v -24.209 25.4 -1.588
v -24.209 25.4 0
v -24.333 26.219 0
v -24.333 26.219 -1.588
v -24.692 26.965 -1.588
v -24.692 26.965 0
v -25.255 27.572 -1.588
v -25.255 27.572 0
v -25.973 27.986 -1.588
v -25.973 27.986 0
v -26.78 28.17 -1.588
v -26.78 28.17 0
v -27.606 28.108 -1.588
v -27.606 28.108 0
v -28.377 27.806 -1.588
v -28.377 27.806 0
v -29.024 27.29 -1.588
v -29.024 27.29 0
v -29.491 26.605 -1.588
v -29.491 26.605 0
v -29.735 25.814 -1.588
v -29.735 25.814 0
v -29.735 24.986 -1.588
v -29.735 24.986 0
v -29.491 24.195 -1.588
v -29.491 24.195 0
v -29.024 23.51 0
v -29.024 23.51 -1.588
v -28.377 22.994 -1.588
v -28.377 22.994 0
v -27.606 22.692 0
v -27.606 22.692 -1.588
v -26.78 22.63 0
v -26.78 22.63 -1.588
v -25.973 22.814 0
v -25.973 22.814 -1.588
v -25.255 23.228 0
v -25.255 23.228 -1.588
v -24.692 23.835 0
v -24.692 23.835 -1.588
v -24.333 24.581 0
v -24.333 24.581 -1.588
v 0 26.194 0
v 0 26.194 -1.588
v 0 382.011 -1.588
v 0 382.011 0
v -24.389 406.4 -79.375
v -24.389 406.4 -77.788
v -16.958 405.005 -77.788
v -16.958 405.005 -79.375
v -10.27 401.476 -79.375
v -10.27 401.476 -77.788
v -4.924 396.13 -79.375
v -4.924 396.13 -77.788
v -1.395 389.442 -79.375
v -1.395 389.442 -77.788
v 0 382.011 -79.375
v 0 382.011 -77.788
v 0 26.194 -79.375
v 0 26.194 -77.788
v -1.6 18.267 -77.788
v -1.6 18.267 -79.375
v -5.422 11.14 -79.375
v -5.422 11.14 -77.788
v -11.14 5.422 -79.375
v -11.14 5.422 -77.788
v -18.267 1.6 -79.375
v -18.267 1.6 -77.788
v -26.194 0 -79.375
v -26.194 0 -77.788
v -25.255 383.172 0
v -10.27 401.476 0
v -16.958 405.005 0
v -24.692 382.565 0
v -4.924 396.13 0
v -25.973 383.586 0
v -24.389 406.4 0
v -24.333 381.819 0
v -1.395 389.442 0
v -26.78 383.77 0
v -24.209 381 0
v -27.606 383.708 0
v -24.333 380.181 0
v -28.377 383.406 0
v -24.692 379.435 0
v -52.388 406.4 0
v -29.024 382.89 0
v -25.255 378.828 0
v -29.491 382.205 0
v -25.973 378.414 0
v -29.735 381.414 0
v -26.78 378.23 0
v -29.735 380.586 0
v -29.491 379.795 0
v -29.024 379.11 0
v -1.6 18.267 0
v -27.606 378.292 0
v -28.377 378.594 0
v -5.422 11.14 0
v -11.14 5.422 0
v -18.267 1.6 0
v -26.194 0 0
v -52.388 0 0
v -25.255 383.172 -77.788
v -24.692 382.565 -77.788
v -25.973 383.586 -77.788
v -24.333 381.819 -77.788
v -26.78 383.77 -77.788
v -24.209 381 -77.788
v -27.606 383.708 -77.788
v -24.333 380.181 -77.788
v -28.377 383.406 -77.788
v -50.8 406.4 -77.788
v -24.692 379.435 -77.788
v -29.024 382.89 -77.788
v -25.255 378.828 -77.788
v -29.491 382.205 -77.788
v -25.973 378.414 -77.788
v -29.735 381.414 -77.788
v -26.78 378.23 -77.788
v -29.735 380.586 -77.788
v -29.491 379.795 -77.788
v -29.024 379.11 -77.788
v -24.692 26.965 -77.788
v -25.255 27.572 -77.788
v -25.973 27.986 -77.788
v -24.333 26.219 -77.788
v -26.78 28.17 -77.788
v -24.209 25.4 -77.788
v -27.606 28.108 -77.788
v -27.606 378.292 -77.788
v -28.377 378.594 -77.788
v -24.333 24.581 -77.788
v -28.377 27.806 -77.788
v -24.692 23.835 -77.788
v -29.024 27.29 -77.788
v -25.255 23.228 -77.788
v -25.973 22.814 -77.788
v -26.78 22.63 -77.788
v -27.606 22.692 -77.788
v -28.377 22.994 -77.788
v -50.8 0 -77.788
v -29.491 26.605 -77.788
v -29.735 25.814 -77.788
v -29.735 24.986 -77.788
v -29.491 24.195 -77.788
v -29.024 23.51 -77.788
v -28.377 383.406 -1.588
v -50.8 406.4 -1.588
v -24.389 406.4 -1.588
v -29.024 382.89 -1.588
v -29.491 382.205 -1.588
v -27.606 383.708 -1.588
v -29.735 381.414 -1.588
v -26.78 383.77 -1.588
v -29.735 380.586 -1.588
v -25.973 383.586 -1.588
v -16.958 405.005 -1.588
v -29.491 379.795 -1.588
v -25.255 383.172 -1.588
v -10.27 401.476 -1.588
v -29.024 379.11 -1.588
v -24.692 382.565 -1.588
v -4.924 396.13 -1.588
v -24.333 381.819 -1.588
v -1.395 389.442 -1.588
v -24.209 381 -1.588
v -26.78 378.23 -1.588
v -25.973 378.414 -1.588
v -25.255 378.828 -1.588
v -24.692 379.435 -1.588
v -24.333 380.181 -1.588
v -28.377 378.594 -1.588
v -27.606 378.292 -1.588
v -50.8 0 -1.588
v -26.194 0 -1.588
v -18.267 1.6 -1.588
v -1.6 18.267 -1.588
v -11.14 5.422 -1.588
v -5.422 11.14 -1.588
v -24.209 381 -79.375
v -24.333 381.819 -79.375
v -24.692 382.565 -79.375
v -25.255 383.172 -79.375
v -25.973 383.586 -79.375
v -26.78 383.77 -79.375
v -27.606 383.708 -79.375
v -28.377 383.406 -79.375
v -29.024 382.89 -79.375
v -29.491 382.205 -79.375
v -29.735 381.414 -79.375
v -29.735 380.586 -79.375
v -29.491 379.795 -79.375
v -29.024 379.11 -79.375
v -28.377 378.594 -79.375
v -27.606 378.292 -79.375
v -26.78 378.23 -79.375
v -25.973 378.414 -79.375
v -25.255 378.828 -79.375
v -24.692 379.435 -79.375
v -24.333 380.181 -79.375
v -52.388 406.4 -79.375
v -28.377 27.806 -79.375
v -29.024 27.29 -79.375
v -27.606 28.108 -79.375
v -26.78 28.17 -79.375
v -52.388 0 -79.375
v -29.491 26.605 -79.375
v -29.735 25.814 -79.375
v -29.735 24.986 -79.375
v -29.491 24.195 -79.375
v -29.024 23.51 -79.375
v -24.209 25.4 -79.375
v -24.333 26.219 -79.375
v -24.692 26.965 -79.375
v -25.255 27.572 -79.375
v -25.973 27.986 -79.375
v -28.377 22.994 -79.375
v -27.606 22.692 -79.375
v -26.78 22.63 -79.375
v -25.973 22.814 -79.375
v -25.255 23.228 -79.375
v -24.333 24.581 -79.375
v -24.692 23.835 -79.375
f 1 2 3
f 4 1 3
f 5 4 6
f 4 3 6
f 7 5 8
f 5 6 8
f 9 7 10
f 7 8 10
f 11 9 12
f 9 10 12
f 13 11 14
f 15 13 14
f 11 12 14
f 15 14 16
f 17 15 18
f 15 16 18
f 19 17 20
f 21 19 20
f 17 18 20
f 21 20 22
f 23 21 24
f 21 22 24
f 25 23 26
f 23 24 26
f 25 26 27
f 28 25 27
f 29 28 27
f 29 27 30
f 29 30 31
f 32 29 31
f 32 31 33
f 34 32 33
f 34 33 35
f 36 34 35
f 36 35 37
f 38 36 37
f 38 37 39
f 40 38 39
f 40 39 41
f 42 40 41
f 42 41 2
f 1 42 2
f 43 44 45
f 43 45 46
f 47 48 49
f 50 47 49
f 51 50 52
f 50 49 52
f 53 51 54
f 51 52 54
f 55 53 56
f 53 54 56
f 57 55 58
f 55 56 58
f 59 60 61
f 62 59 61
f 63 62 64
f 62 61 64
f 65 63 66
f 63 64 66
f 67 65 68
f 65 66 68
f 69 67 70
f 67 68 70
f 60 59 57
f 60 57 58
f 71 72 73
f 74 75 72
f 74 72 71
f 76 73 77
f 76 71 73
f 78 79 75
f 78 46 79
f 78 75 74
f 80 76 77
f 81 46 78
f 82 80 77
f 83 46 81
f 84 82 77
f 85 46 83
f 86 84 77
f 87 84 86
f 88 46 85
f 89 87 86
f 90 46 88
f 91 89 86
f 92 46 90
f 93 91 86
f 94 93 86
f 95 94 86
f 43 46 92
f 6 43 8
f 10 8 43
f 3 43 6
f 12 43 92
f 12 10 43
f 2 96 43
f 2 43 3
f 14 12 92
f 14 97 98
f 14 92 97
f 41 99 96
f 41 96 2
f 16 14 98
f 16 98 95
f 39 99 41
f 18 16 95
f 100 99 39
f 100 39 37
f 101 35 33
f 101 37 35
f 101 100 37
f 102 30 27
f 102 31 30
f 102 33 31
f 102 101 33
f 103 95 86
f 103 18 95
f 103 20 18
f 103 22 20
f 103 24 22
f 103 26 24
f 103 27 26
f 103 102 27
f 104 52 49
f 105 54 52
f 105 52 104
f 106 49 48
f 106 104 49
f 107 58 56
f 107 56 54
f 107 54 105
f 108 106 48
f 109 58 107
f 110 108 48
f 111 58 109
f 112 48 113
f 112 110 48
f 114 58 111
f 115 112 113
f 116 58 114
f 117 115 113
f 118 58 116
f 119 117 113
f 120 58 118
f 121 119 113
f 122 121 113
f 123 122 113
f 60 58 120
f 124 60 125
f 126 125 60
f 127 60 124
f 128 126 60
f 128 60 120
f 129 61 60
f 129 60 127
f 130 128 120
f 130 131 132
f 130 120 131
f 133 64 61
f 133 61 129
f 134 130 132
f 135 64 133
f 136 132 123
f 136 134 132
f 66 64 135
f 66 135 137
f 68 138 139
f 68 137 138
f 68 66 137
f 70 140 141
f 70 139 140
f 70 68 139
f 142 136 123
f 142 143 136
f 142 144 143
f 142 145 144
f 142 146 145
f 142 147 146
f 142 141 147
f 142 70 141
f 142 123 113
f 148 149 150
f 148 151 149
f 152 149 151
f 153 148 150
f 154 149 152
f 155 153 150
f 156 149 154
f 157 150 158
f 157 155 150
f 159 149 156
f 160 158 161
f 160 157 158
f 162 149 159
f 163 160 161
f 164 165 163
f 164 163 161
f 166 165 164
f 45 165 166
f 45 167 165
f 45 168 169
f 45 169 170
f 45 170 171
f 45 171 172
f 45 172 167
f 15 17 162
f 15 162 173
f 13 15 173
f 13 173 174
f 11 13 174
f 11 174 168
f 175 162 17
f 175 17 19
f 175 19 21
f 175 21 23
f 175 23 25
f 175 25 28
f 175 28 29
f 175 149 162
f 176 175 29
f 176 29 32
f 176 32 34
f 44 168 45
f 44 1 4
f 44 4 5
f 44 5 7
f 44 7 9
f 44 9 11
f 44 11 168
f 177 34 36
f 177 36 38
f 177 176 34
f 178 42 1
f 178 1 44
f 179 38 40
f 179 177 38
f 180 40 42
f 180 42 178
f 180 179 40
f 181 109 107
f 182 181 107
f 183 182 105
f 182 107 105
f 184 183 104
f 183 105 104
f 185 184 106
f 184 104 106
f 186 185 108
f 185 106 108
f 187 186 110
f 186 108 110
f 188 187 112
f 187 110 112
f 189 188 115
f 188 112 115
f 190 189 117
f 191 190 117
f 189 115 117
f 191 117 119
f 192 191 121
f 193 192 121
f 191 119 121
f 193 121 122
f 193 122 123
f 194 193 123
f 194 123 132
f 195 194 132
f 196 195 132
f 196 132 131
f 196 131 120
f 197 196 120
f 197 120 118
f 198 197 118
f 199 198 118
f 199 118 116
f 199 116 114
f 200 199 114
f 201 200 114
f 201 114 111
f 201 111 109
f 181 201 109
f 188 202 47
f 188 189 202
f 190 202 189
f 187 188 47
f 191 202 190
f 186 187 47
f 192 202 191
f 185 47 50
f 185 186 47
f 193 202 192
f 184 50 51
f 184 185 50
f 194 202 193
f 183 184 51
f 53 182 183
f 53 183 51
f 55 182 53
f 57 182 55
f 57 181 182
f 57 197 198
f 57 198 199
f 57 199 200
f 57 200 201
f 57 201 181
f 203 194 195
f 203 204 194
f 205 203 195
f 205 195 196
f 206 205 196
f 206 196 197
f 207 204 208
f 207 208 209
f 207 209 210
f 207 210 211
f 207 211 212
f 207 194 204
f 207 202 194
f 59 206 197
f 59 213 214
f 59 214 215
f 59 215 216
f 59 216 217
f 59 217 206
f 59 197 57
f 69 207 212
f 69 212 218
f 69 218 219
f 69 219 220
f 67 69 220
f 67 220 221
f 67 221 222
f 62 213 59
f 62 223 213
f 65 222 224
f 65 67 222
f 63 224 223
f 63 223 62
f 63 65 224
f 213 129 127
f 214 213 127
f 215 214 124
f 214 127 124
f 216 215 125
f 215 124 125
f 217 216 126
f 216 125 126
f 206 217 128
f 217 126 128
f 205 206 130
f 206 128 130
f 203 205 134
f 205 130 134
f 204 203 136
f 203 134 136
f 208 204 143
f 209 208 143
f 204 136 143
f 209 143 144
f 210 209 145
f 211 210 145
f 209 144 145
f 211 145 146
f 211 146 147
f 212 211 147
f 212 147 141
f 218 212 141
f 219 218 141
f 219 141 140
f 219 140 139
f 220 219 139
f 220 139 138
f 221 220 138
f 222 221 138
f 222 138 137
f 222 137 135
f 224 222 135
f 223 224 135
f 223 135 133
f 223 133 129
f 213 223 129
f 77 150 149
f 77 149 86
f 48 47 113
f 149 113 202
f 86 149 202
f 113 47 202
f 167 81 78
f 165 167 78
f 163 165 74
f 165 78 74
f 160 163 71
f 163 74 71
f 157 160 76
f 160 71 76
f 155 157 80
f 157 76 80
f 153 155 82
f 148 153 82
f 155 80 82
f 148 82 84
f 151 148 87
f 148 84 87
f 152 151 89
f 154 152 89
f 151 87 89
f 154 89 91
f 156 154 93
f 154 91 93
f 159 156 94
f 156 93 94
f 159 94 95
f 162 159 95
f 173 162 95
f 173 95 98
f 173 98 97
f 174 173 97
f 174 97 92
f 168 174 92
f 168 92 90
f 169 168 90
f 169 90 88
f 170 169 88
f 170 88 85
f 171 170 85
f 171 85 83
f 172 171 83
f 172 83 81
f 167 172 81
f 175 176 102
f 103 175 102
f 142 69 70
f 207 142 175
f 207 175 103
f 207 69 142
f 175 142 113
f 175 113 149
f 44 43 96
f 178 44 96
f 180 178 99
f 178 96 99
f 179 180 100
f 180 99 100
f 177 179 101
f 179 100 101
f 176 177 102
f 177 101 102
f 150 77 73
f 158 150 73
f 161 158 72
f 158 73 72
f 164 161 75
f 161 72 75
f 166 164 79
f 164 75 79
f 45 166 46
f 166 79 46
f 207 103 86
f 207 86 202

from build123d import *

# Parameters (mm, degrees)
BOSS_EXTRUDE1_DEPTH = 406.4
CUT_EXTRUDE1_DEPTH  = 406.4
SKETCH3_R           = 2.778125
CUT_EXTRUDE2_DEPTH  = 406.4


with BuildPart() as part:
    # Sketch1 → Boss-Extrude1 (new body)
    with BuildSketch(Plane(origin=(0, 0, 0), x_dir=(1, 0, 0), z_dir=(0, 1, 0))):
        Polygon((0, 0), (-52.3875, 0), (-52.3875, 79.375), (0, 79.375), (0, 77.7875), (-50.8, 77.7875), (-50.8, 1.5875), (0, 1.5875), align=None)
    extrude(amount=BOSS_EXTRUDE1_DEPTH)

    # Sketch2 → Cut-Extrude1 (cut)
    with BuildSketch(Plane.XY):
        with BuildLine():
            Line((0, 0), (0, 26.19375))
            ThreePointArc((0, 26.19375), (-8.070831371, 8.070831371), (-26.19375, 0))
            Line((-26.19375, 0), (0, 0))
        make_face()
        with BuildLine():
            Line((0, 382.011163771), (0, 406.4))
            Line((0, 406.4), (-24.388836229, 406.4))
            ThreePointArc((-24.388836229, 406.4), (-7.396266769, 399.003733231), (0, 382.011163771))
        make_face()
    extrude(amount=-CUT_EXTRUDE1_DEPTH, mode=Mode.SUBTRACT)

    # Sketch3 → Cut-Extrude2 (cut)
    with BuildSketch(Plane.XY):
        with Locations((-26.9875, 381)):
            Circle(SKETCH3_R)
        with Locations((-26.9875, 25.4)):
            Circle(SKETCH3_R)
    extrude(amount=-CUT_EXTRUDE2_DEPTH, mode=Mode.SUBTRACT)


solid = part.part
